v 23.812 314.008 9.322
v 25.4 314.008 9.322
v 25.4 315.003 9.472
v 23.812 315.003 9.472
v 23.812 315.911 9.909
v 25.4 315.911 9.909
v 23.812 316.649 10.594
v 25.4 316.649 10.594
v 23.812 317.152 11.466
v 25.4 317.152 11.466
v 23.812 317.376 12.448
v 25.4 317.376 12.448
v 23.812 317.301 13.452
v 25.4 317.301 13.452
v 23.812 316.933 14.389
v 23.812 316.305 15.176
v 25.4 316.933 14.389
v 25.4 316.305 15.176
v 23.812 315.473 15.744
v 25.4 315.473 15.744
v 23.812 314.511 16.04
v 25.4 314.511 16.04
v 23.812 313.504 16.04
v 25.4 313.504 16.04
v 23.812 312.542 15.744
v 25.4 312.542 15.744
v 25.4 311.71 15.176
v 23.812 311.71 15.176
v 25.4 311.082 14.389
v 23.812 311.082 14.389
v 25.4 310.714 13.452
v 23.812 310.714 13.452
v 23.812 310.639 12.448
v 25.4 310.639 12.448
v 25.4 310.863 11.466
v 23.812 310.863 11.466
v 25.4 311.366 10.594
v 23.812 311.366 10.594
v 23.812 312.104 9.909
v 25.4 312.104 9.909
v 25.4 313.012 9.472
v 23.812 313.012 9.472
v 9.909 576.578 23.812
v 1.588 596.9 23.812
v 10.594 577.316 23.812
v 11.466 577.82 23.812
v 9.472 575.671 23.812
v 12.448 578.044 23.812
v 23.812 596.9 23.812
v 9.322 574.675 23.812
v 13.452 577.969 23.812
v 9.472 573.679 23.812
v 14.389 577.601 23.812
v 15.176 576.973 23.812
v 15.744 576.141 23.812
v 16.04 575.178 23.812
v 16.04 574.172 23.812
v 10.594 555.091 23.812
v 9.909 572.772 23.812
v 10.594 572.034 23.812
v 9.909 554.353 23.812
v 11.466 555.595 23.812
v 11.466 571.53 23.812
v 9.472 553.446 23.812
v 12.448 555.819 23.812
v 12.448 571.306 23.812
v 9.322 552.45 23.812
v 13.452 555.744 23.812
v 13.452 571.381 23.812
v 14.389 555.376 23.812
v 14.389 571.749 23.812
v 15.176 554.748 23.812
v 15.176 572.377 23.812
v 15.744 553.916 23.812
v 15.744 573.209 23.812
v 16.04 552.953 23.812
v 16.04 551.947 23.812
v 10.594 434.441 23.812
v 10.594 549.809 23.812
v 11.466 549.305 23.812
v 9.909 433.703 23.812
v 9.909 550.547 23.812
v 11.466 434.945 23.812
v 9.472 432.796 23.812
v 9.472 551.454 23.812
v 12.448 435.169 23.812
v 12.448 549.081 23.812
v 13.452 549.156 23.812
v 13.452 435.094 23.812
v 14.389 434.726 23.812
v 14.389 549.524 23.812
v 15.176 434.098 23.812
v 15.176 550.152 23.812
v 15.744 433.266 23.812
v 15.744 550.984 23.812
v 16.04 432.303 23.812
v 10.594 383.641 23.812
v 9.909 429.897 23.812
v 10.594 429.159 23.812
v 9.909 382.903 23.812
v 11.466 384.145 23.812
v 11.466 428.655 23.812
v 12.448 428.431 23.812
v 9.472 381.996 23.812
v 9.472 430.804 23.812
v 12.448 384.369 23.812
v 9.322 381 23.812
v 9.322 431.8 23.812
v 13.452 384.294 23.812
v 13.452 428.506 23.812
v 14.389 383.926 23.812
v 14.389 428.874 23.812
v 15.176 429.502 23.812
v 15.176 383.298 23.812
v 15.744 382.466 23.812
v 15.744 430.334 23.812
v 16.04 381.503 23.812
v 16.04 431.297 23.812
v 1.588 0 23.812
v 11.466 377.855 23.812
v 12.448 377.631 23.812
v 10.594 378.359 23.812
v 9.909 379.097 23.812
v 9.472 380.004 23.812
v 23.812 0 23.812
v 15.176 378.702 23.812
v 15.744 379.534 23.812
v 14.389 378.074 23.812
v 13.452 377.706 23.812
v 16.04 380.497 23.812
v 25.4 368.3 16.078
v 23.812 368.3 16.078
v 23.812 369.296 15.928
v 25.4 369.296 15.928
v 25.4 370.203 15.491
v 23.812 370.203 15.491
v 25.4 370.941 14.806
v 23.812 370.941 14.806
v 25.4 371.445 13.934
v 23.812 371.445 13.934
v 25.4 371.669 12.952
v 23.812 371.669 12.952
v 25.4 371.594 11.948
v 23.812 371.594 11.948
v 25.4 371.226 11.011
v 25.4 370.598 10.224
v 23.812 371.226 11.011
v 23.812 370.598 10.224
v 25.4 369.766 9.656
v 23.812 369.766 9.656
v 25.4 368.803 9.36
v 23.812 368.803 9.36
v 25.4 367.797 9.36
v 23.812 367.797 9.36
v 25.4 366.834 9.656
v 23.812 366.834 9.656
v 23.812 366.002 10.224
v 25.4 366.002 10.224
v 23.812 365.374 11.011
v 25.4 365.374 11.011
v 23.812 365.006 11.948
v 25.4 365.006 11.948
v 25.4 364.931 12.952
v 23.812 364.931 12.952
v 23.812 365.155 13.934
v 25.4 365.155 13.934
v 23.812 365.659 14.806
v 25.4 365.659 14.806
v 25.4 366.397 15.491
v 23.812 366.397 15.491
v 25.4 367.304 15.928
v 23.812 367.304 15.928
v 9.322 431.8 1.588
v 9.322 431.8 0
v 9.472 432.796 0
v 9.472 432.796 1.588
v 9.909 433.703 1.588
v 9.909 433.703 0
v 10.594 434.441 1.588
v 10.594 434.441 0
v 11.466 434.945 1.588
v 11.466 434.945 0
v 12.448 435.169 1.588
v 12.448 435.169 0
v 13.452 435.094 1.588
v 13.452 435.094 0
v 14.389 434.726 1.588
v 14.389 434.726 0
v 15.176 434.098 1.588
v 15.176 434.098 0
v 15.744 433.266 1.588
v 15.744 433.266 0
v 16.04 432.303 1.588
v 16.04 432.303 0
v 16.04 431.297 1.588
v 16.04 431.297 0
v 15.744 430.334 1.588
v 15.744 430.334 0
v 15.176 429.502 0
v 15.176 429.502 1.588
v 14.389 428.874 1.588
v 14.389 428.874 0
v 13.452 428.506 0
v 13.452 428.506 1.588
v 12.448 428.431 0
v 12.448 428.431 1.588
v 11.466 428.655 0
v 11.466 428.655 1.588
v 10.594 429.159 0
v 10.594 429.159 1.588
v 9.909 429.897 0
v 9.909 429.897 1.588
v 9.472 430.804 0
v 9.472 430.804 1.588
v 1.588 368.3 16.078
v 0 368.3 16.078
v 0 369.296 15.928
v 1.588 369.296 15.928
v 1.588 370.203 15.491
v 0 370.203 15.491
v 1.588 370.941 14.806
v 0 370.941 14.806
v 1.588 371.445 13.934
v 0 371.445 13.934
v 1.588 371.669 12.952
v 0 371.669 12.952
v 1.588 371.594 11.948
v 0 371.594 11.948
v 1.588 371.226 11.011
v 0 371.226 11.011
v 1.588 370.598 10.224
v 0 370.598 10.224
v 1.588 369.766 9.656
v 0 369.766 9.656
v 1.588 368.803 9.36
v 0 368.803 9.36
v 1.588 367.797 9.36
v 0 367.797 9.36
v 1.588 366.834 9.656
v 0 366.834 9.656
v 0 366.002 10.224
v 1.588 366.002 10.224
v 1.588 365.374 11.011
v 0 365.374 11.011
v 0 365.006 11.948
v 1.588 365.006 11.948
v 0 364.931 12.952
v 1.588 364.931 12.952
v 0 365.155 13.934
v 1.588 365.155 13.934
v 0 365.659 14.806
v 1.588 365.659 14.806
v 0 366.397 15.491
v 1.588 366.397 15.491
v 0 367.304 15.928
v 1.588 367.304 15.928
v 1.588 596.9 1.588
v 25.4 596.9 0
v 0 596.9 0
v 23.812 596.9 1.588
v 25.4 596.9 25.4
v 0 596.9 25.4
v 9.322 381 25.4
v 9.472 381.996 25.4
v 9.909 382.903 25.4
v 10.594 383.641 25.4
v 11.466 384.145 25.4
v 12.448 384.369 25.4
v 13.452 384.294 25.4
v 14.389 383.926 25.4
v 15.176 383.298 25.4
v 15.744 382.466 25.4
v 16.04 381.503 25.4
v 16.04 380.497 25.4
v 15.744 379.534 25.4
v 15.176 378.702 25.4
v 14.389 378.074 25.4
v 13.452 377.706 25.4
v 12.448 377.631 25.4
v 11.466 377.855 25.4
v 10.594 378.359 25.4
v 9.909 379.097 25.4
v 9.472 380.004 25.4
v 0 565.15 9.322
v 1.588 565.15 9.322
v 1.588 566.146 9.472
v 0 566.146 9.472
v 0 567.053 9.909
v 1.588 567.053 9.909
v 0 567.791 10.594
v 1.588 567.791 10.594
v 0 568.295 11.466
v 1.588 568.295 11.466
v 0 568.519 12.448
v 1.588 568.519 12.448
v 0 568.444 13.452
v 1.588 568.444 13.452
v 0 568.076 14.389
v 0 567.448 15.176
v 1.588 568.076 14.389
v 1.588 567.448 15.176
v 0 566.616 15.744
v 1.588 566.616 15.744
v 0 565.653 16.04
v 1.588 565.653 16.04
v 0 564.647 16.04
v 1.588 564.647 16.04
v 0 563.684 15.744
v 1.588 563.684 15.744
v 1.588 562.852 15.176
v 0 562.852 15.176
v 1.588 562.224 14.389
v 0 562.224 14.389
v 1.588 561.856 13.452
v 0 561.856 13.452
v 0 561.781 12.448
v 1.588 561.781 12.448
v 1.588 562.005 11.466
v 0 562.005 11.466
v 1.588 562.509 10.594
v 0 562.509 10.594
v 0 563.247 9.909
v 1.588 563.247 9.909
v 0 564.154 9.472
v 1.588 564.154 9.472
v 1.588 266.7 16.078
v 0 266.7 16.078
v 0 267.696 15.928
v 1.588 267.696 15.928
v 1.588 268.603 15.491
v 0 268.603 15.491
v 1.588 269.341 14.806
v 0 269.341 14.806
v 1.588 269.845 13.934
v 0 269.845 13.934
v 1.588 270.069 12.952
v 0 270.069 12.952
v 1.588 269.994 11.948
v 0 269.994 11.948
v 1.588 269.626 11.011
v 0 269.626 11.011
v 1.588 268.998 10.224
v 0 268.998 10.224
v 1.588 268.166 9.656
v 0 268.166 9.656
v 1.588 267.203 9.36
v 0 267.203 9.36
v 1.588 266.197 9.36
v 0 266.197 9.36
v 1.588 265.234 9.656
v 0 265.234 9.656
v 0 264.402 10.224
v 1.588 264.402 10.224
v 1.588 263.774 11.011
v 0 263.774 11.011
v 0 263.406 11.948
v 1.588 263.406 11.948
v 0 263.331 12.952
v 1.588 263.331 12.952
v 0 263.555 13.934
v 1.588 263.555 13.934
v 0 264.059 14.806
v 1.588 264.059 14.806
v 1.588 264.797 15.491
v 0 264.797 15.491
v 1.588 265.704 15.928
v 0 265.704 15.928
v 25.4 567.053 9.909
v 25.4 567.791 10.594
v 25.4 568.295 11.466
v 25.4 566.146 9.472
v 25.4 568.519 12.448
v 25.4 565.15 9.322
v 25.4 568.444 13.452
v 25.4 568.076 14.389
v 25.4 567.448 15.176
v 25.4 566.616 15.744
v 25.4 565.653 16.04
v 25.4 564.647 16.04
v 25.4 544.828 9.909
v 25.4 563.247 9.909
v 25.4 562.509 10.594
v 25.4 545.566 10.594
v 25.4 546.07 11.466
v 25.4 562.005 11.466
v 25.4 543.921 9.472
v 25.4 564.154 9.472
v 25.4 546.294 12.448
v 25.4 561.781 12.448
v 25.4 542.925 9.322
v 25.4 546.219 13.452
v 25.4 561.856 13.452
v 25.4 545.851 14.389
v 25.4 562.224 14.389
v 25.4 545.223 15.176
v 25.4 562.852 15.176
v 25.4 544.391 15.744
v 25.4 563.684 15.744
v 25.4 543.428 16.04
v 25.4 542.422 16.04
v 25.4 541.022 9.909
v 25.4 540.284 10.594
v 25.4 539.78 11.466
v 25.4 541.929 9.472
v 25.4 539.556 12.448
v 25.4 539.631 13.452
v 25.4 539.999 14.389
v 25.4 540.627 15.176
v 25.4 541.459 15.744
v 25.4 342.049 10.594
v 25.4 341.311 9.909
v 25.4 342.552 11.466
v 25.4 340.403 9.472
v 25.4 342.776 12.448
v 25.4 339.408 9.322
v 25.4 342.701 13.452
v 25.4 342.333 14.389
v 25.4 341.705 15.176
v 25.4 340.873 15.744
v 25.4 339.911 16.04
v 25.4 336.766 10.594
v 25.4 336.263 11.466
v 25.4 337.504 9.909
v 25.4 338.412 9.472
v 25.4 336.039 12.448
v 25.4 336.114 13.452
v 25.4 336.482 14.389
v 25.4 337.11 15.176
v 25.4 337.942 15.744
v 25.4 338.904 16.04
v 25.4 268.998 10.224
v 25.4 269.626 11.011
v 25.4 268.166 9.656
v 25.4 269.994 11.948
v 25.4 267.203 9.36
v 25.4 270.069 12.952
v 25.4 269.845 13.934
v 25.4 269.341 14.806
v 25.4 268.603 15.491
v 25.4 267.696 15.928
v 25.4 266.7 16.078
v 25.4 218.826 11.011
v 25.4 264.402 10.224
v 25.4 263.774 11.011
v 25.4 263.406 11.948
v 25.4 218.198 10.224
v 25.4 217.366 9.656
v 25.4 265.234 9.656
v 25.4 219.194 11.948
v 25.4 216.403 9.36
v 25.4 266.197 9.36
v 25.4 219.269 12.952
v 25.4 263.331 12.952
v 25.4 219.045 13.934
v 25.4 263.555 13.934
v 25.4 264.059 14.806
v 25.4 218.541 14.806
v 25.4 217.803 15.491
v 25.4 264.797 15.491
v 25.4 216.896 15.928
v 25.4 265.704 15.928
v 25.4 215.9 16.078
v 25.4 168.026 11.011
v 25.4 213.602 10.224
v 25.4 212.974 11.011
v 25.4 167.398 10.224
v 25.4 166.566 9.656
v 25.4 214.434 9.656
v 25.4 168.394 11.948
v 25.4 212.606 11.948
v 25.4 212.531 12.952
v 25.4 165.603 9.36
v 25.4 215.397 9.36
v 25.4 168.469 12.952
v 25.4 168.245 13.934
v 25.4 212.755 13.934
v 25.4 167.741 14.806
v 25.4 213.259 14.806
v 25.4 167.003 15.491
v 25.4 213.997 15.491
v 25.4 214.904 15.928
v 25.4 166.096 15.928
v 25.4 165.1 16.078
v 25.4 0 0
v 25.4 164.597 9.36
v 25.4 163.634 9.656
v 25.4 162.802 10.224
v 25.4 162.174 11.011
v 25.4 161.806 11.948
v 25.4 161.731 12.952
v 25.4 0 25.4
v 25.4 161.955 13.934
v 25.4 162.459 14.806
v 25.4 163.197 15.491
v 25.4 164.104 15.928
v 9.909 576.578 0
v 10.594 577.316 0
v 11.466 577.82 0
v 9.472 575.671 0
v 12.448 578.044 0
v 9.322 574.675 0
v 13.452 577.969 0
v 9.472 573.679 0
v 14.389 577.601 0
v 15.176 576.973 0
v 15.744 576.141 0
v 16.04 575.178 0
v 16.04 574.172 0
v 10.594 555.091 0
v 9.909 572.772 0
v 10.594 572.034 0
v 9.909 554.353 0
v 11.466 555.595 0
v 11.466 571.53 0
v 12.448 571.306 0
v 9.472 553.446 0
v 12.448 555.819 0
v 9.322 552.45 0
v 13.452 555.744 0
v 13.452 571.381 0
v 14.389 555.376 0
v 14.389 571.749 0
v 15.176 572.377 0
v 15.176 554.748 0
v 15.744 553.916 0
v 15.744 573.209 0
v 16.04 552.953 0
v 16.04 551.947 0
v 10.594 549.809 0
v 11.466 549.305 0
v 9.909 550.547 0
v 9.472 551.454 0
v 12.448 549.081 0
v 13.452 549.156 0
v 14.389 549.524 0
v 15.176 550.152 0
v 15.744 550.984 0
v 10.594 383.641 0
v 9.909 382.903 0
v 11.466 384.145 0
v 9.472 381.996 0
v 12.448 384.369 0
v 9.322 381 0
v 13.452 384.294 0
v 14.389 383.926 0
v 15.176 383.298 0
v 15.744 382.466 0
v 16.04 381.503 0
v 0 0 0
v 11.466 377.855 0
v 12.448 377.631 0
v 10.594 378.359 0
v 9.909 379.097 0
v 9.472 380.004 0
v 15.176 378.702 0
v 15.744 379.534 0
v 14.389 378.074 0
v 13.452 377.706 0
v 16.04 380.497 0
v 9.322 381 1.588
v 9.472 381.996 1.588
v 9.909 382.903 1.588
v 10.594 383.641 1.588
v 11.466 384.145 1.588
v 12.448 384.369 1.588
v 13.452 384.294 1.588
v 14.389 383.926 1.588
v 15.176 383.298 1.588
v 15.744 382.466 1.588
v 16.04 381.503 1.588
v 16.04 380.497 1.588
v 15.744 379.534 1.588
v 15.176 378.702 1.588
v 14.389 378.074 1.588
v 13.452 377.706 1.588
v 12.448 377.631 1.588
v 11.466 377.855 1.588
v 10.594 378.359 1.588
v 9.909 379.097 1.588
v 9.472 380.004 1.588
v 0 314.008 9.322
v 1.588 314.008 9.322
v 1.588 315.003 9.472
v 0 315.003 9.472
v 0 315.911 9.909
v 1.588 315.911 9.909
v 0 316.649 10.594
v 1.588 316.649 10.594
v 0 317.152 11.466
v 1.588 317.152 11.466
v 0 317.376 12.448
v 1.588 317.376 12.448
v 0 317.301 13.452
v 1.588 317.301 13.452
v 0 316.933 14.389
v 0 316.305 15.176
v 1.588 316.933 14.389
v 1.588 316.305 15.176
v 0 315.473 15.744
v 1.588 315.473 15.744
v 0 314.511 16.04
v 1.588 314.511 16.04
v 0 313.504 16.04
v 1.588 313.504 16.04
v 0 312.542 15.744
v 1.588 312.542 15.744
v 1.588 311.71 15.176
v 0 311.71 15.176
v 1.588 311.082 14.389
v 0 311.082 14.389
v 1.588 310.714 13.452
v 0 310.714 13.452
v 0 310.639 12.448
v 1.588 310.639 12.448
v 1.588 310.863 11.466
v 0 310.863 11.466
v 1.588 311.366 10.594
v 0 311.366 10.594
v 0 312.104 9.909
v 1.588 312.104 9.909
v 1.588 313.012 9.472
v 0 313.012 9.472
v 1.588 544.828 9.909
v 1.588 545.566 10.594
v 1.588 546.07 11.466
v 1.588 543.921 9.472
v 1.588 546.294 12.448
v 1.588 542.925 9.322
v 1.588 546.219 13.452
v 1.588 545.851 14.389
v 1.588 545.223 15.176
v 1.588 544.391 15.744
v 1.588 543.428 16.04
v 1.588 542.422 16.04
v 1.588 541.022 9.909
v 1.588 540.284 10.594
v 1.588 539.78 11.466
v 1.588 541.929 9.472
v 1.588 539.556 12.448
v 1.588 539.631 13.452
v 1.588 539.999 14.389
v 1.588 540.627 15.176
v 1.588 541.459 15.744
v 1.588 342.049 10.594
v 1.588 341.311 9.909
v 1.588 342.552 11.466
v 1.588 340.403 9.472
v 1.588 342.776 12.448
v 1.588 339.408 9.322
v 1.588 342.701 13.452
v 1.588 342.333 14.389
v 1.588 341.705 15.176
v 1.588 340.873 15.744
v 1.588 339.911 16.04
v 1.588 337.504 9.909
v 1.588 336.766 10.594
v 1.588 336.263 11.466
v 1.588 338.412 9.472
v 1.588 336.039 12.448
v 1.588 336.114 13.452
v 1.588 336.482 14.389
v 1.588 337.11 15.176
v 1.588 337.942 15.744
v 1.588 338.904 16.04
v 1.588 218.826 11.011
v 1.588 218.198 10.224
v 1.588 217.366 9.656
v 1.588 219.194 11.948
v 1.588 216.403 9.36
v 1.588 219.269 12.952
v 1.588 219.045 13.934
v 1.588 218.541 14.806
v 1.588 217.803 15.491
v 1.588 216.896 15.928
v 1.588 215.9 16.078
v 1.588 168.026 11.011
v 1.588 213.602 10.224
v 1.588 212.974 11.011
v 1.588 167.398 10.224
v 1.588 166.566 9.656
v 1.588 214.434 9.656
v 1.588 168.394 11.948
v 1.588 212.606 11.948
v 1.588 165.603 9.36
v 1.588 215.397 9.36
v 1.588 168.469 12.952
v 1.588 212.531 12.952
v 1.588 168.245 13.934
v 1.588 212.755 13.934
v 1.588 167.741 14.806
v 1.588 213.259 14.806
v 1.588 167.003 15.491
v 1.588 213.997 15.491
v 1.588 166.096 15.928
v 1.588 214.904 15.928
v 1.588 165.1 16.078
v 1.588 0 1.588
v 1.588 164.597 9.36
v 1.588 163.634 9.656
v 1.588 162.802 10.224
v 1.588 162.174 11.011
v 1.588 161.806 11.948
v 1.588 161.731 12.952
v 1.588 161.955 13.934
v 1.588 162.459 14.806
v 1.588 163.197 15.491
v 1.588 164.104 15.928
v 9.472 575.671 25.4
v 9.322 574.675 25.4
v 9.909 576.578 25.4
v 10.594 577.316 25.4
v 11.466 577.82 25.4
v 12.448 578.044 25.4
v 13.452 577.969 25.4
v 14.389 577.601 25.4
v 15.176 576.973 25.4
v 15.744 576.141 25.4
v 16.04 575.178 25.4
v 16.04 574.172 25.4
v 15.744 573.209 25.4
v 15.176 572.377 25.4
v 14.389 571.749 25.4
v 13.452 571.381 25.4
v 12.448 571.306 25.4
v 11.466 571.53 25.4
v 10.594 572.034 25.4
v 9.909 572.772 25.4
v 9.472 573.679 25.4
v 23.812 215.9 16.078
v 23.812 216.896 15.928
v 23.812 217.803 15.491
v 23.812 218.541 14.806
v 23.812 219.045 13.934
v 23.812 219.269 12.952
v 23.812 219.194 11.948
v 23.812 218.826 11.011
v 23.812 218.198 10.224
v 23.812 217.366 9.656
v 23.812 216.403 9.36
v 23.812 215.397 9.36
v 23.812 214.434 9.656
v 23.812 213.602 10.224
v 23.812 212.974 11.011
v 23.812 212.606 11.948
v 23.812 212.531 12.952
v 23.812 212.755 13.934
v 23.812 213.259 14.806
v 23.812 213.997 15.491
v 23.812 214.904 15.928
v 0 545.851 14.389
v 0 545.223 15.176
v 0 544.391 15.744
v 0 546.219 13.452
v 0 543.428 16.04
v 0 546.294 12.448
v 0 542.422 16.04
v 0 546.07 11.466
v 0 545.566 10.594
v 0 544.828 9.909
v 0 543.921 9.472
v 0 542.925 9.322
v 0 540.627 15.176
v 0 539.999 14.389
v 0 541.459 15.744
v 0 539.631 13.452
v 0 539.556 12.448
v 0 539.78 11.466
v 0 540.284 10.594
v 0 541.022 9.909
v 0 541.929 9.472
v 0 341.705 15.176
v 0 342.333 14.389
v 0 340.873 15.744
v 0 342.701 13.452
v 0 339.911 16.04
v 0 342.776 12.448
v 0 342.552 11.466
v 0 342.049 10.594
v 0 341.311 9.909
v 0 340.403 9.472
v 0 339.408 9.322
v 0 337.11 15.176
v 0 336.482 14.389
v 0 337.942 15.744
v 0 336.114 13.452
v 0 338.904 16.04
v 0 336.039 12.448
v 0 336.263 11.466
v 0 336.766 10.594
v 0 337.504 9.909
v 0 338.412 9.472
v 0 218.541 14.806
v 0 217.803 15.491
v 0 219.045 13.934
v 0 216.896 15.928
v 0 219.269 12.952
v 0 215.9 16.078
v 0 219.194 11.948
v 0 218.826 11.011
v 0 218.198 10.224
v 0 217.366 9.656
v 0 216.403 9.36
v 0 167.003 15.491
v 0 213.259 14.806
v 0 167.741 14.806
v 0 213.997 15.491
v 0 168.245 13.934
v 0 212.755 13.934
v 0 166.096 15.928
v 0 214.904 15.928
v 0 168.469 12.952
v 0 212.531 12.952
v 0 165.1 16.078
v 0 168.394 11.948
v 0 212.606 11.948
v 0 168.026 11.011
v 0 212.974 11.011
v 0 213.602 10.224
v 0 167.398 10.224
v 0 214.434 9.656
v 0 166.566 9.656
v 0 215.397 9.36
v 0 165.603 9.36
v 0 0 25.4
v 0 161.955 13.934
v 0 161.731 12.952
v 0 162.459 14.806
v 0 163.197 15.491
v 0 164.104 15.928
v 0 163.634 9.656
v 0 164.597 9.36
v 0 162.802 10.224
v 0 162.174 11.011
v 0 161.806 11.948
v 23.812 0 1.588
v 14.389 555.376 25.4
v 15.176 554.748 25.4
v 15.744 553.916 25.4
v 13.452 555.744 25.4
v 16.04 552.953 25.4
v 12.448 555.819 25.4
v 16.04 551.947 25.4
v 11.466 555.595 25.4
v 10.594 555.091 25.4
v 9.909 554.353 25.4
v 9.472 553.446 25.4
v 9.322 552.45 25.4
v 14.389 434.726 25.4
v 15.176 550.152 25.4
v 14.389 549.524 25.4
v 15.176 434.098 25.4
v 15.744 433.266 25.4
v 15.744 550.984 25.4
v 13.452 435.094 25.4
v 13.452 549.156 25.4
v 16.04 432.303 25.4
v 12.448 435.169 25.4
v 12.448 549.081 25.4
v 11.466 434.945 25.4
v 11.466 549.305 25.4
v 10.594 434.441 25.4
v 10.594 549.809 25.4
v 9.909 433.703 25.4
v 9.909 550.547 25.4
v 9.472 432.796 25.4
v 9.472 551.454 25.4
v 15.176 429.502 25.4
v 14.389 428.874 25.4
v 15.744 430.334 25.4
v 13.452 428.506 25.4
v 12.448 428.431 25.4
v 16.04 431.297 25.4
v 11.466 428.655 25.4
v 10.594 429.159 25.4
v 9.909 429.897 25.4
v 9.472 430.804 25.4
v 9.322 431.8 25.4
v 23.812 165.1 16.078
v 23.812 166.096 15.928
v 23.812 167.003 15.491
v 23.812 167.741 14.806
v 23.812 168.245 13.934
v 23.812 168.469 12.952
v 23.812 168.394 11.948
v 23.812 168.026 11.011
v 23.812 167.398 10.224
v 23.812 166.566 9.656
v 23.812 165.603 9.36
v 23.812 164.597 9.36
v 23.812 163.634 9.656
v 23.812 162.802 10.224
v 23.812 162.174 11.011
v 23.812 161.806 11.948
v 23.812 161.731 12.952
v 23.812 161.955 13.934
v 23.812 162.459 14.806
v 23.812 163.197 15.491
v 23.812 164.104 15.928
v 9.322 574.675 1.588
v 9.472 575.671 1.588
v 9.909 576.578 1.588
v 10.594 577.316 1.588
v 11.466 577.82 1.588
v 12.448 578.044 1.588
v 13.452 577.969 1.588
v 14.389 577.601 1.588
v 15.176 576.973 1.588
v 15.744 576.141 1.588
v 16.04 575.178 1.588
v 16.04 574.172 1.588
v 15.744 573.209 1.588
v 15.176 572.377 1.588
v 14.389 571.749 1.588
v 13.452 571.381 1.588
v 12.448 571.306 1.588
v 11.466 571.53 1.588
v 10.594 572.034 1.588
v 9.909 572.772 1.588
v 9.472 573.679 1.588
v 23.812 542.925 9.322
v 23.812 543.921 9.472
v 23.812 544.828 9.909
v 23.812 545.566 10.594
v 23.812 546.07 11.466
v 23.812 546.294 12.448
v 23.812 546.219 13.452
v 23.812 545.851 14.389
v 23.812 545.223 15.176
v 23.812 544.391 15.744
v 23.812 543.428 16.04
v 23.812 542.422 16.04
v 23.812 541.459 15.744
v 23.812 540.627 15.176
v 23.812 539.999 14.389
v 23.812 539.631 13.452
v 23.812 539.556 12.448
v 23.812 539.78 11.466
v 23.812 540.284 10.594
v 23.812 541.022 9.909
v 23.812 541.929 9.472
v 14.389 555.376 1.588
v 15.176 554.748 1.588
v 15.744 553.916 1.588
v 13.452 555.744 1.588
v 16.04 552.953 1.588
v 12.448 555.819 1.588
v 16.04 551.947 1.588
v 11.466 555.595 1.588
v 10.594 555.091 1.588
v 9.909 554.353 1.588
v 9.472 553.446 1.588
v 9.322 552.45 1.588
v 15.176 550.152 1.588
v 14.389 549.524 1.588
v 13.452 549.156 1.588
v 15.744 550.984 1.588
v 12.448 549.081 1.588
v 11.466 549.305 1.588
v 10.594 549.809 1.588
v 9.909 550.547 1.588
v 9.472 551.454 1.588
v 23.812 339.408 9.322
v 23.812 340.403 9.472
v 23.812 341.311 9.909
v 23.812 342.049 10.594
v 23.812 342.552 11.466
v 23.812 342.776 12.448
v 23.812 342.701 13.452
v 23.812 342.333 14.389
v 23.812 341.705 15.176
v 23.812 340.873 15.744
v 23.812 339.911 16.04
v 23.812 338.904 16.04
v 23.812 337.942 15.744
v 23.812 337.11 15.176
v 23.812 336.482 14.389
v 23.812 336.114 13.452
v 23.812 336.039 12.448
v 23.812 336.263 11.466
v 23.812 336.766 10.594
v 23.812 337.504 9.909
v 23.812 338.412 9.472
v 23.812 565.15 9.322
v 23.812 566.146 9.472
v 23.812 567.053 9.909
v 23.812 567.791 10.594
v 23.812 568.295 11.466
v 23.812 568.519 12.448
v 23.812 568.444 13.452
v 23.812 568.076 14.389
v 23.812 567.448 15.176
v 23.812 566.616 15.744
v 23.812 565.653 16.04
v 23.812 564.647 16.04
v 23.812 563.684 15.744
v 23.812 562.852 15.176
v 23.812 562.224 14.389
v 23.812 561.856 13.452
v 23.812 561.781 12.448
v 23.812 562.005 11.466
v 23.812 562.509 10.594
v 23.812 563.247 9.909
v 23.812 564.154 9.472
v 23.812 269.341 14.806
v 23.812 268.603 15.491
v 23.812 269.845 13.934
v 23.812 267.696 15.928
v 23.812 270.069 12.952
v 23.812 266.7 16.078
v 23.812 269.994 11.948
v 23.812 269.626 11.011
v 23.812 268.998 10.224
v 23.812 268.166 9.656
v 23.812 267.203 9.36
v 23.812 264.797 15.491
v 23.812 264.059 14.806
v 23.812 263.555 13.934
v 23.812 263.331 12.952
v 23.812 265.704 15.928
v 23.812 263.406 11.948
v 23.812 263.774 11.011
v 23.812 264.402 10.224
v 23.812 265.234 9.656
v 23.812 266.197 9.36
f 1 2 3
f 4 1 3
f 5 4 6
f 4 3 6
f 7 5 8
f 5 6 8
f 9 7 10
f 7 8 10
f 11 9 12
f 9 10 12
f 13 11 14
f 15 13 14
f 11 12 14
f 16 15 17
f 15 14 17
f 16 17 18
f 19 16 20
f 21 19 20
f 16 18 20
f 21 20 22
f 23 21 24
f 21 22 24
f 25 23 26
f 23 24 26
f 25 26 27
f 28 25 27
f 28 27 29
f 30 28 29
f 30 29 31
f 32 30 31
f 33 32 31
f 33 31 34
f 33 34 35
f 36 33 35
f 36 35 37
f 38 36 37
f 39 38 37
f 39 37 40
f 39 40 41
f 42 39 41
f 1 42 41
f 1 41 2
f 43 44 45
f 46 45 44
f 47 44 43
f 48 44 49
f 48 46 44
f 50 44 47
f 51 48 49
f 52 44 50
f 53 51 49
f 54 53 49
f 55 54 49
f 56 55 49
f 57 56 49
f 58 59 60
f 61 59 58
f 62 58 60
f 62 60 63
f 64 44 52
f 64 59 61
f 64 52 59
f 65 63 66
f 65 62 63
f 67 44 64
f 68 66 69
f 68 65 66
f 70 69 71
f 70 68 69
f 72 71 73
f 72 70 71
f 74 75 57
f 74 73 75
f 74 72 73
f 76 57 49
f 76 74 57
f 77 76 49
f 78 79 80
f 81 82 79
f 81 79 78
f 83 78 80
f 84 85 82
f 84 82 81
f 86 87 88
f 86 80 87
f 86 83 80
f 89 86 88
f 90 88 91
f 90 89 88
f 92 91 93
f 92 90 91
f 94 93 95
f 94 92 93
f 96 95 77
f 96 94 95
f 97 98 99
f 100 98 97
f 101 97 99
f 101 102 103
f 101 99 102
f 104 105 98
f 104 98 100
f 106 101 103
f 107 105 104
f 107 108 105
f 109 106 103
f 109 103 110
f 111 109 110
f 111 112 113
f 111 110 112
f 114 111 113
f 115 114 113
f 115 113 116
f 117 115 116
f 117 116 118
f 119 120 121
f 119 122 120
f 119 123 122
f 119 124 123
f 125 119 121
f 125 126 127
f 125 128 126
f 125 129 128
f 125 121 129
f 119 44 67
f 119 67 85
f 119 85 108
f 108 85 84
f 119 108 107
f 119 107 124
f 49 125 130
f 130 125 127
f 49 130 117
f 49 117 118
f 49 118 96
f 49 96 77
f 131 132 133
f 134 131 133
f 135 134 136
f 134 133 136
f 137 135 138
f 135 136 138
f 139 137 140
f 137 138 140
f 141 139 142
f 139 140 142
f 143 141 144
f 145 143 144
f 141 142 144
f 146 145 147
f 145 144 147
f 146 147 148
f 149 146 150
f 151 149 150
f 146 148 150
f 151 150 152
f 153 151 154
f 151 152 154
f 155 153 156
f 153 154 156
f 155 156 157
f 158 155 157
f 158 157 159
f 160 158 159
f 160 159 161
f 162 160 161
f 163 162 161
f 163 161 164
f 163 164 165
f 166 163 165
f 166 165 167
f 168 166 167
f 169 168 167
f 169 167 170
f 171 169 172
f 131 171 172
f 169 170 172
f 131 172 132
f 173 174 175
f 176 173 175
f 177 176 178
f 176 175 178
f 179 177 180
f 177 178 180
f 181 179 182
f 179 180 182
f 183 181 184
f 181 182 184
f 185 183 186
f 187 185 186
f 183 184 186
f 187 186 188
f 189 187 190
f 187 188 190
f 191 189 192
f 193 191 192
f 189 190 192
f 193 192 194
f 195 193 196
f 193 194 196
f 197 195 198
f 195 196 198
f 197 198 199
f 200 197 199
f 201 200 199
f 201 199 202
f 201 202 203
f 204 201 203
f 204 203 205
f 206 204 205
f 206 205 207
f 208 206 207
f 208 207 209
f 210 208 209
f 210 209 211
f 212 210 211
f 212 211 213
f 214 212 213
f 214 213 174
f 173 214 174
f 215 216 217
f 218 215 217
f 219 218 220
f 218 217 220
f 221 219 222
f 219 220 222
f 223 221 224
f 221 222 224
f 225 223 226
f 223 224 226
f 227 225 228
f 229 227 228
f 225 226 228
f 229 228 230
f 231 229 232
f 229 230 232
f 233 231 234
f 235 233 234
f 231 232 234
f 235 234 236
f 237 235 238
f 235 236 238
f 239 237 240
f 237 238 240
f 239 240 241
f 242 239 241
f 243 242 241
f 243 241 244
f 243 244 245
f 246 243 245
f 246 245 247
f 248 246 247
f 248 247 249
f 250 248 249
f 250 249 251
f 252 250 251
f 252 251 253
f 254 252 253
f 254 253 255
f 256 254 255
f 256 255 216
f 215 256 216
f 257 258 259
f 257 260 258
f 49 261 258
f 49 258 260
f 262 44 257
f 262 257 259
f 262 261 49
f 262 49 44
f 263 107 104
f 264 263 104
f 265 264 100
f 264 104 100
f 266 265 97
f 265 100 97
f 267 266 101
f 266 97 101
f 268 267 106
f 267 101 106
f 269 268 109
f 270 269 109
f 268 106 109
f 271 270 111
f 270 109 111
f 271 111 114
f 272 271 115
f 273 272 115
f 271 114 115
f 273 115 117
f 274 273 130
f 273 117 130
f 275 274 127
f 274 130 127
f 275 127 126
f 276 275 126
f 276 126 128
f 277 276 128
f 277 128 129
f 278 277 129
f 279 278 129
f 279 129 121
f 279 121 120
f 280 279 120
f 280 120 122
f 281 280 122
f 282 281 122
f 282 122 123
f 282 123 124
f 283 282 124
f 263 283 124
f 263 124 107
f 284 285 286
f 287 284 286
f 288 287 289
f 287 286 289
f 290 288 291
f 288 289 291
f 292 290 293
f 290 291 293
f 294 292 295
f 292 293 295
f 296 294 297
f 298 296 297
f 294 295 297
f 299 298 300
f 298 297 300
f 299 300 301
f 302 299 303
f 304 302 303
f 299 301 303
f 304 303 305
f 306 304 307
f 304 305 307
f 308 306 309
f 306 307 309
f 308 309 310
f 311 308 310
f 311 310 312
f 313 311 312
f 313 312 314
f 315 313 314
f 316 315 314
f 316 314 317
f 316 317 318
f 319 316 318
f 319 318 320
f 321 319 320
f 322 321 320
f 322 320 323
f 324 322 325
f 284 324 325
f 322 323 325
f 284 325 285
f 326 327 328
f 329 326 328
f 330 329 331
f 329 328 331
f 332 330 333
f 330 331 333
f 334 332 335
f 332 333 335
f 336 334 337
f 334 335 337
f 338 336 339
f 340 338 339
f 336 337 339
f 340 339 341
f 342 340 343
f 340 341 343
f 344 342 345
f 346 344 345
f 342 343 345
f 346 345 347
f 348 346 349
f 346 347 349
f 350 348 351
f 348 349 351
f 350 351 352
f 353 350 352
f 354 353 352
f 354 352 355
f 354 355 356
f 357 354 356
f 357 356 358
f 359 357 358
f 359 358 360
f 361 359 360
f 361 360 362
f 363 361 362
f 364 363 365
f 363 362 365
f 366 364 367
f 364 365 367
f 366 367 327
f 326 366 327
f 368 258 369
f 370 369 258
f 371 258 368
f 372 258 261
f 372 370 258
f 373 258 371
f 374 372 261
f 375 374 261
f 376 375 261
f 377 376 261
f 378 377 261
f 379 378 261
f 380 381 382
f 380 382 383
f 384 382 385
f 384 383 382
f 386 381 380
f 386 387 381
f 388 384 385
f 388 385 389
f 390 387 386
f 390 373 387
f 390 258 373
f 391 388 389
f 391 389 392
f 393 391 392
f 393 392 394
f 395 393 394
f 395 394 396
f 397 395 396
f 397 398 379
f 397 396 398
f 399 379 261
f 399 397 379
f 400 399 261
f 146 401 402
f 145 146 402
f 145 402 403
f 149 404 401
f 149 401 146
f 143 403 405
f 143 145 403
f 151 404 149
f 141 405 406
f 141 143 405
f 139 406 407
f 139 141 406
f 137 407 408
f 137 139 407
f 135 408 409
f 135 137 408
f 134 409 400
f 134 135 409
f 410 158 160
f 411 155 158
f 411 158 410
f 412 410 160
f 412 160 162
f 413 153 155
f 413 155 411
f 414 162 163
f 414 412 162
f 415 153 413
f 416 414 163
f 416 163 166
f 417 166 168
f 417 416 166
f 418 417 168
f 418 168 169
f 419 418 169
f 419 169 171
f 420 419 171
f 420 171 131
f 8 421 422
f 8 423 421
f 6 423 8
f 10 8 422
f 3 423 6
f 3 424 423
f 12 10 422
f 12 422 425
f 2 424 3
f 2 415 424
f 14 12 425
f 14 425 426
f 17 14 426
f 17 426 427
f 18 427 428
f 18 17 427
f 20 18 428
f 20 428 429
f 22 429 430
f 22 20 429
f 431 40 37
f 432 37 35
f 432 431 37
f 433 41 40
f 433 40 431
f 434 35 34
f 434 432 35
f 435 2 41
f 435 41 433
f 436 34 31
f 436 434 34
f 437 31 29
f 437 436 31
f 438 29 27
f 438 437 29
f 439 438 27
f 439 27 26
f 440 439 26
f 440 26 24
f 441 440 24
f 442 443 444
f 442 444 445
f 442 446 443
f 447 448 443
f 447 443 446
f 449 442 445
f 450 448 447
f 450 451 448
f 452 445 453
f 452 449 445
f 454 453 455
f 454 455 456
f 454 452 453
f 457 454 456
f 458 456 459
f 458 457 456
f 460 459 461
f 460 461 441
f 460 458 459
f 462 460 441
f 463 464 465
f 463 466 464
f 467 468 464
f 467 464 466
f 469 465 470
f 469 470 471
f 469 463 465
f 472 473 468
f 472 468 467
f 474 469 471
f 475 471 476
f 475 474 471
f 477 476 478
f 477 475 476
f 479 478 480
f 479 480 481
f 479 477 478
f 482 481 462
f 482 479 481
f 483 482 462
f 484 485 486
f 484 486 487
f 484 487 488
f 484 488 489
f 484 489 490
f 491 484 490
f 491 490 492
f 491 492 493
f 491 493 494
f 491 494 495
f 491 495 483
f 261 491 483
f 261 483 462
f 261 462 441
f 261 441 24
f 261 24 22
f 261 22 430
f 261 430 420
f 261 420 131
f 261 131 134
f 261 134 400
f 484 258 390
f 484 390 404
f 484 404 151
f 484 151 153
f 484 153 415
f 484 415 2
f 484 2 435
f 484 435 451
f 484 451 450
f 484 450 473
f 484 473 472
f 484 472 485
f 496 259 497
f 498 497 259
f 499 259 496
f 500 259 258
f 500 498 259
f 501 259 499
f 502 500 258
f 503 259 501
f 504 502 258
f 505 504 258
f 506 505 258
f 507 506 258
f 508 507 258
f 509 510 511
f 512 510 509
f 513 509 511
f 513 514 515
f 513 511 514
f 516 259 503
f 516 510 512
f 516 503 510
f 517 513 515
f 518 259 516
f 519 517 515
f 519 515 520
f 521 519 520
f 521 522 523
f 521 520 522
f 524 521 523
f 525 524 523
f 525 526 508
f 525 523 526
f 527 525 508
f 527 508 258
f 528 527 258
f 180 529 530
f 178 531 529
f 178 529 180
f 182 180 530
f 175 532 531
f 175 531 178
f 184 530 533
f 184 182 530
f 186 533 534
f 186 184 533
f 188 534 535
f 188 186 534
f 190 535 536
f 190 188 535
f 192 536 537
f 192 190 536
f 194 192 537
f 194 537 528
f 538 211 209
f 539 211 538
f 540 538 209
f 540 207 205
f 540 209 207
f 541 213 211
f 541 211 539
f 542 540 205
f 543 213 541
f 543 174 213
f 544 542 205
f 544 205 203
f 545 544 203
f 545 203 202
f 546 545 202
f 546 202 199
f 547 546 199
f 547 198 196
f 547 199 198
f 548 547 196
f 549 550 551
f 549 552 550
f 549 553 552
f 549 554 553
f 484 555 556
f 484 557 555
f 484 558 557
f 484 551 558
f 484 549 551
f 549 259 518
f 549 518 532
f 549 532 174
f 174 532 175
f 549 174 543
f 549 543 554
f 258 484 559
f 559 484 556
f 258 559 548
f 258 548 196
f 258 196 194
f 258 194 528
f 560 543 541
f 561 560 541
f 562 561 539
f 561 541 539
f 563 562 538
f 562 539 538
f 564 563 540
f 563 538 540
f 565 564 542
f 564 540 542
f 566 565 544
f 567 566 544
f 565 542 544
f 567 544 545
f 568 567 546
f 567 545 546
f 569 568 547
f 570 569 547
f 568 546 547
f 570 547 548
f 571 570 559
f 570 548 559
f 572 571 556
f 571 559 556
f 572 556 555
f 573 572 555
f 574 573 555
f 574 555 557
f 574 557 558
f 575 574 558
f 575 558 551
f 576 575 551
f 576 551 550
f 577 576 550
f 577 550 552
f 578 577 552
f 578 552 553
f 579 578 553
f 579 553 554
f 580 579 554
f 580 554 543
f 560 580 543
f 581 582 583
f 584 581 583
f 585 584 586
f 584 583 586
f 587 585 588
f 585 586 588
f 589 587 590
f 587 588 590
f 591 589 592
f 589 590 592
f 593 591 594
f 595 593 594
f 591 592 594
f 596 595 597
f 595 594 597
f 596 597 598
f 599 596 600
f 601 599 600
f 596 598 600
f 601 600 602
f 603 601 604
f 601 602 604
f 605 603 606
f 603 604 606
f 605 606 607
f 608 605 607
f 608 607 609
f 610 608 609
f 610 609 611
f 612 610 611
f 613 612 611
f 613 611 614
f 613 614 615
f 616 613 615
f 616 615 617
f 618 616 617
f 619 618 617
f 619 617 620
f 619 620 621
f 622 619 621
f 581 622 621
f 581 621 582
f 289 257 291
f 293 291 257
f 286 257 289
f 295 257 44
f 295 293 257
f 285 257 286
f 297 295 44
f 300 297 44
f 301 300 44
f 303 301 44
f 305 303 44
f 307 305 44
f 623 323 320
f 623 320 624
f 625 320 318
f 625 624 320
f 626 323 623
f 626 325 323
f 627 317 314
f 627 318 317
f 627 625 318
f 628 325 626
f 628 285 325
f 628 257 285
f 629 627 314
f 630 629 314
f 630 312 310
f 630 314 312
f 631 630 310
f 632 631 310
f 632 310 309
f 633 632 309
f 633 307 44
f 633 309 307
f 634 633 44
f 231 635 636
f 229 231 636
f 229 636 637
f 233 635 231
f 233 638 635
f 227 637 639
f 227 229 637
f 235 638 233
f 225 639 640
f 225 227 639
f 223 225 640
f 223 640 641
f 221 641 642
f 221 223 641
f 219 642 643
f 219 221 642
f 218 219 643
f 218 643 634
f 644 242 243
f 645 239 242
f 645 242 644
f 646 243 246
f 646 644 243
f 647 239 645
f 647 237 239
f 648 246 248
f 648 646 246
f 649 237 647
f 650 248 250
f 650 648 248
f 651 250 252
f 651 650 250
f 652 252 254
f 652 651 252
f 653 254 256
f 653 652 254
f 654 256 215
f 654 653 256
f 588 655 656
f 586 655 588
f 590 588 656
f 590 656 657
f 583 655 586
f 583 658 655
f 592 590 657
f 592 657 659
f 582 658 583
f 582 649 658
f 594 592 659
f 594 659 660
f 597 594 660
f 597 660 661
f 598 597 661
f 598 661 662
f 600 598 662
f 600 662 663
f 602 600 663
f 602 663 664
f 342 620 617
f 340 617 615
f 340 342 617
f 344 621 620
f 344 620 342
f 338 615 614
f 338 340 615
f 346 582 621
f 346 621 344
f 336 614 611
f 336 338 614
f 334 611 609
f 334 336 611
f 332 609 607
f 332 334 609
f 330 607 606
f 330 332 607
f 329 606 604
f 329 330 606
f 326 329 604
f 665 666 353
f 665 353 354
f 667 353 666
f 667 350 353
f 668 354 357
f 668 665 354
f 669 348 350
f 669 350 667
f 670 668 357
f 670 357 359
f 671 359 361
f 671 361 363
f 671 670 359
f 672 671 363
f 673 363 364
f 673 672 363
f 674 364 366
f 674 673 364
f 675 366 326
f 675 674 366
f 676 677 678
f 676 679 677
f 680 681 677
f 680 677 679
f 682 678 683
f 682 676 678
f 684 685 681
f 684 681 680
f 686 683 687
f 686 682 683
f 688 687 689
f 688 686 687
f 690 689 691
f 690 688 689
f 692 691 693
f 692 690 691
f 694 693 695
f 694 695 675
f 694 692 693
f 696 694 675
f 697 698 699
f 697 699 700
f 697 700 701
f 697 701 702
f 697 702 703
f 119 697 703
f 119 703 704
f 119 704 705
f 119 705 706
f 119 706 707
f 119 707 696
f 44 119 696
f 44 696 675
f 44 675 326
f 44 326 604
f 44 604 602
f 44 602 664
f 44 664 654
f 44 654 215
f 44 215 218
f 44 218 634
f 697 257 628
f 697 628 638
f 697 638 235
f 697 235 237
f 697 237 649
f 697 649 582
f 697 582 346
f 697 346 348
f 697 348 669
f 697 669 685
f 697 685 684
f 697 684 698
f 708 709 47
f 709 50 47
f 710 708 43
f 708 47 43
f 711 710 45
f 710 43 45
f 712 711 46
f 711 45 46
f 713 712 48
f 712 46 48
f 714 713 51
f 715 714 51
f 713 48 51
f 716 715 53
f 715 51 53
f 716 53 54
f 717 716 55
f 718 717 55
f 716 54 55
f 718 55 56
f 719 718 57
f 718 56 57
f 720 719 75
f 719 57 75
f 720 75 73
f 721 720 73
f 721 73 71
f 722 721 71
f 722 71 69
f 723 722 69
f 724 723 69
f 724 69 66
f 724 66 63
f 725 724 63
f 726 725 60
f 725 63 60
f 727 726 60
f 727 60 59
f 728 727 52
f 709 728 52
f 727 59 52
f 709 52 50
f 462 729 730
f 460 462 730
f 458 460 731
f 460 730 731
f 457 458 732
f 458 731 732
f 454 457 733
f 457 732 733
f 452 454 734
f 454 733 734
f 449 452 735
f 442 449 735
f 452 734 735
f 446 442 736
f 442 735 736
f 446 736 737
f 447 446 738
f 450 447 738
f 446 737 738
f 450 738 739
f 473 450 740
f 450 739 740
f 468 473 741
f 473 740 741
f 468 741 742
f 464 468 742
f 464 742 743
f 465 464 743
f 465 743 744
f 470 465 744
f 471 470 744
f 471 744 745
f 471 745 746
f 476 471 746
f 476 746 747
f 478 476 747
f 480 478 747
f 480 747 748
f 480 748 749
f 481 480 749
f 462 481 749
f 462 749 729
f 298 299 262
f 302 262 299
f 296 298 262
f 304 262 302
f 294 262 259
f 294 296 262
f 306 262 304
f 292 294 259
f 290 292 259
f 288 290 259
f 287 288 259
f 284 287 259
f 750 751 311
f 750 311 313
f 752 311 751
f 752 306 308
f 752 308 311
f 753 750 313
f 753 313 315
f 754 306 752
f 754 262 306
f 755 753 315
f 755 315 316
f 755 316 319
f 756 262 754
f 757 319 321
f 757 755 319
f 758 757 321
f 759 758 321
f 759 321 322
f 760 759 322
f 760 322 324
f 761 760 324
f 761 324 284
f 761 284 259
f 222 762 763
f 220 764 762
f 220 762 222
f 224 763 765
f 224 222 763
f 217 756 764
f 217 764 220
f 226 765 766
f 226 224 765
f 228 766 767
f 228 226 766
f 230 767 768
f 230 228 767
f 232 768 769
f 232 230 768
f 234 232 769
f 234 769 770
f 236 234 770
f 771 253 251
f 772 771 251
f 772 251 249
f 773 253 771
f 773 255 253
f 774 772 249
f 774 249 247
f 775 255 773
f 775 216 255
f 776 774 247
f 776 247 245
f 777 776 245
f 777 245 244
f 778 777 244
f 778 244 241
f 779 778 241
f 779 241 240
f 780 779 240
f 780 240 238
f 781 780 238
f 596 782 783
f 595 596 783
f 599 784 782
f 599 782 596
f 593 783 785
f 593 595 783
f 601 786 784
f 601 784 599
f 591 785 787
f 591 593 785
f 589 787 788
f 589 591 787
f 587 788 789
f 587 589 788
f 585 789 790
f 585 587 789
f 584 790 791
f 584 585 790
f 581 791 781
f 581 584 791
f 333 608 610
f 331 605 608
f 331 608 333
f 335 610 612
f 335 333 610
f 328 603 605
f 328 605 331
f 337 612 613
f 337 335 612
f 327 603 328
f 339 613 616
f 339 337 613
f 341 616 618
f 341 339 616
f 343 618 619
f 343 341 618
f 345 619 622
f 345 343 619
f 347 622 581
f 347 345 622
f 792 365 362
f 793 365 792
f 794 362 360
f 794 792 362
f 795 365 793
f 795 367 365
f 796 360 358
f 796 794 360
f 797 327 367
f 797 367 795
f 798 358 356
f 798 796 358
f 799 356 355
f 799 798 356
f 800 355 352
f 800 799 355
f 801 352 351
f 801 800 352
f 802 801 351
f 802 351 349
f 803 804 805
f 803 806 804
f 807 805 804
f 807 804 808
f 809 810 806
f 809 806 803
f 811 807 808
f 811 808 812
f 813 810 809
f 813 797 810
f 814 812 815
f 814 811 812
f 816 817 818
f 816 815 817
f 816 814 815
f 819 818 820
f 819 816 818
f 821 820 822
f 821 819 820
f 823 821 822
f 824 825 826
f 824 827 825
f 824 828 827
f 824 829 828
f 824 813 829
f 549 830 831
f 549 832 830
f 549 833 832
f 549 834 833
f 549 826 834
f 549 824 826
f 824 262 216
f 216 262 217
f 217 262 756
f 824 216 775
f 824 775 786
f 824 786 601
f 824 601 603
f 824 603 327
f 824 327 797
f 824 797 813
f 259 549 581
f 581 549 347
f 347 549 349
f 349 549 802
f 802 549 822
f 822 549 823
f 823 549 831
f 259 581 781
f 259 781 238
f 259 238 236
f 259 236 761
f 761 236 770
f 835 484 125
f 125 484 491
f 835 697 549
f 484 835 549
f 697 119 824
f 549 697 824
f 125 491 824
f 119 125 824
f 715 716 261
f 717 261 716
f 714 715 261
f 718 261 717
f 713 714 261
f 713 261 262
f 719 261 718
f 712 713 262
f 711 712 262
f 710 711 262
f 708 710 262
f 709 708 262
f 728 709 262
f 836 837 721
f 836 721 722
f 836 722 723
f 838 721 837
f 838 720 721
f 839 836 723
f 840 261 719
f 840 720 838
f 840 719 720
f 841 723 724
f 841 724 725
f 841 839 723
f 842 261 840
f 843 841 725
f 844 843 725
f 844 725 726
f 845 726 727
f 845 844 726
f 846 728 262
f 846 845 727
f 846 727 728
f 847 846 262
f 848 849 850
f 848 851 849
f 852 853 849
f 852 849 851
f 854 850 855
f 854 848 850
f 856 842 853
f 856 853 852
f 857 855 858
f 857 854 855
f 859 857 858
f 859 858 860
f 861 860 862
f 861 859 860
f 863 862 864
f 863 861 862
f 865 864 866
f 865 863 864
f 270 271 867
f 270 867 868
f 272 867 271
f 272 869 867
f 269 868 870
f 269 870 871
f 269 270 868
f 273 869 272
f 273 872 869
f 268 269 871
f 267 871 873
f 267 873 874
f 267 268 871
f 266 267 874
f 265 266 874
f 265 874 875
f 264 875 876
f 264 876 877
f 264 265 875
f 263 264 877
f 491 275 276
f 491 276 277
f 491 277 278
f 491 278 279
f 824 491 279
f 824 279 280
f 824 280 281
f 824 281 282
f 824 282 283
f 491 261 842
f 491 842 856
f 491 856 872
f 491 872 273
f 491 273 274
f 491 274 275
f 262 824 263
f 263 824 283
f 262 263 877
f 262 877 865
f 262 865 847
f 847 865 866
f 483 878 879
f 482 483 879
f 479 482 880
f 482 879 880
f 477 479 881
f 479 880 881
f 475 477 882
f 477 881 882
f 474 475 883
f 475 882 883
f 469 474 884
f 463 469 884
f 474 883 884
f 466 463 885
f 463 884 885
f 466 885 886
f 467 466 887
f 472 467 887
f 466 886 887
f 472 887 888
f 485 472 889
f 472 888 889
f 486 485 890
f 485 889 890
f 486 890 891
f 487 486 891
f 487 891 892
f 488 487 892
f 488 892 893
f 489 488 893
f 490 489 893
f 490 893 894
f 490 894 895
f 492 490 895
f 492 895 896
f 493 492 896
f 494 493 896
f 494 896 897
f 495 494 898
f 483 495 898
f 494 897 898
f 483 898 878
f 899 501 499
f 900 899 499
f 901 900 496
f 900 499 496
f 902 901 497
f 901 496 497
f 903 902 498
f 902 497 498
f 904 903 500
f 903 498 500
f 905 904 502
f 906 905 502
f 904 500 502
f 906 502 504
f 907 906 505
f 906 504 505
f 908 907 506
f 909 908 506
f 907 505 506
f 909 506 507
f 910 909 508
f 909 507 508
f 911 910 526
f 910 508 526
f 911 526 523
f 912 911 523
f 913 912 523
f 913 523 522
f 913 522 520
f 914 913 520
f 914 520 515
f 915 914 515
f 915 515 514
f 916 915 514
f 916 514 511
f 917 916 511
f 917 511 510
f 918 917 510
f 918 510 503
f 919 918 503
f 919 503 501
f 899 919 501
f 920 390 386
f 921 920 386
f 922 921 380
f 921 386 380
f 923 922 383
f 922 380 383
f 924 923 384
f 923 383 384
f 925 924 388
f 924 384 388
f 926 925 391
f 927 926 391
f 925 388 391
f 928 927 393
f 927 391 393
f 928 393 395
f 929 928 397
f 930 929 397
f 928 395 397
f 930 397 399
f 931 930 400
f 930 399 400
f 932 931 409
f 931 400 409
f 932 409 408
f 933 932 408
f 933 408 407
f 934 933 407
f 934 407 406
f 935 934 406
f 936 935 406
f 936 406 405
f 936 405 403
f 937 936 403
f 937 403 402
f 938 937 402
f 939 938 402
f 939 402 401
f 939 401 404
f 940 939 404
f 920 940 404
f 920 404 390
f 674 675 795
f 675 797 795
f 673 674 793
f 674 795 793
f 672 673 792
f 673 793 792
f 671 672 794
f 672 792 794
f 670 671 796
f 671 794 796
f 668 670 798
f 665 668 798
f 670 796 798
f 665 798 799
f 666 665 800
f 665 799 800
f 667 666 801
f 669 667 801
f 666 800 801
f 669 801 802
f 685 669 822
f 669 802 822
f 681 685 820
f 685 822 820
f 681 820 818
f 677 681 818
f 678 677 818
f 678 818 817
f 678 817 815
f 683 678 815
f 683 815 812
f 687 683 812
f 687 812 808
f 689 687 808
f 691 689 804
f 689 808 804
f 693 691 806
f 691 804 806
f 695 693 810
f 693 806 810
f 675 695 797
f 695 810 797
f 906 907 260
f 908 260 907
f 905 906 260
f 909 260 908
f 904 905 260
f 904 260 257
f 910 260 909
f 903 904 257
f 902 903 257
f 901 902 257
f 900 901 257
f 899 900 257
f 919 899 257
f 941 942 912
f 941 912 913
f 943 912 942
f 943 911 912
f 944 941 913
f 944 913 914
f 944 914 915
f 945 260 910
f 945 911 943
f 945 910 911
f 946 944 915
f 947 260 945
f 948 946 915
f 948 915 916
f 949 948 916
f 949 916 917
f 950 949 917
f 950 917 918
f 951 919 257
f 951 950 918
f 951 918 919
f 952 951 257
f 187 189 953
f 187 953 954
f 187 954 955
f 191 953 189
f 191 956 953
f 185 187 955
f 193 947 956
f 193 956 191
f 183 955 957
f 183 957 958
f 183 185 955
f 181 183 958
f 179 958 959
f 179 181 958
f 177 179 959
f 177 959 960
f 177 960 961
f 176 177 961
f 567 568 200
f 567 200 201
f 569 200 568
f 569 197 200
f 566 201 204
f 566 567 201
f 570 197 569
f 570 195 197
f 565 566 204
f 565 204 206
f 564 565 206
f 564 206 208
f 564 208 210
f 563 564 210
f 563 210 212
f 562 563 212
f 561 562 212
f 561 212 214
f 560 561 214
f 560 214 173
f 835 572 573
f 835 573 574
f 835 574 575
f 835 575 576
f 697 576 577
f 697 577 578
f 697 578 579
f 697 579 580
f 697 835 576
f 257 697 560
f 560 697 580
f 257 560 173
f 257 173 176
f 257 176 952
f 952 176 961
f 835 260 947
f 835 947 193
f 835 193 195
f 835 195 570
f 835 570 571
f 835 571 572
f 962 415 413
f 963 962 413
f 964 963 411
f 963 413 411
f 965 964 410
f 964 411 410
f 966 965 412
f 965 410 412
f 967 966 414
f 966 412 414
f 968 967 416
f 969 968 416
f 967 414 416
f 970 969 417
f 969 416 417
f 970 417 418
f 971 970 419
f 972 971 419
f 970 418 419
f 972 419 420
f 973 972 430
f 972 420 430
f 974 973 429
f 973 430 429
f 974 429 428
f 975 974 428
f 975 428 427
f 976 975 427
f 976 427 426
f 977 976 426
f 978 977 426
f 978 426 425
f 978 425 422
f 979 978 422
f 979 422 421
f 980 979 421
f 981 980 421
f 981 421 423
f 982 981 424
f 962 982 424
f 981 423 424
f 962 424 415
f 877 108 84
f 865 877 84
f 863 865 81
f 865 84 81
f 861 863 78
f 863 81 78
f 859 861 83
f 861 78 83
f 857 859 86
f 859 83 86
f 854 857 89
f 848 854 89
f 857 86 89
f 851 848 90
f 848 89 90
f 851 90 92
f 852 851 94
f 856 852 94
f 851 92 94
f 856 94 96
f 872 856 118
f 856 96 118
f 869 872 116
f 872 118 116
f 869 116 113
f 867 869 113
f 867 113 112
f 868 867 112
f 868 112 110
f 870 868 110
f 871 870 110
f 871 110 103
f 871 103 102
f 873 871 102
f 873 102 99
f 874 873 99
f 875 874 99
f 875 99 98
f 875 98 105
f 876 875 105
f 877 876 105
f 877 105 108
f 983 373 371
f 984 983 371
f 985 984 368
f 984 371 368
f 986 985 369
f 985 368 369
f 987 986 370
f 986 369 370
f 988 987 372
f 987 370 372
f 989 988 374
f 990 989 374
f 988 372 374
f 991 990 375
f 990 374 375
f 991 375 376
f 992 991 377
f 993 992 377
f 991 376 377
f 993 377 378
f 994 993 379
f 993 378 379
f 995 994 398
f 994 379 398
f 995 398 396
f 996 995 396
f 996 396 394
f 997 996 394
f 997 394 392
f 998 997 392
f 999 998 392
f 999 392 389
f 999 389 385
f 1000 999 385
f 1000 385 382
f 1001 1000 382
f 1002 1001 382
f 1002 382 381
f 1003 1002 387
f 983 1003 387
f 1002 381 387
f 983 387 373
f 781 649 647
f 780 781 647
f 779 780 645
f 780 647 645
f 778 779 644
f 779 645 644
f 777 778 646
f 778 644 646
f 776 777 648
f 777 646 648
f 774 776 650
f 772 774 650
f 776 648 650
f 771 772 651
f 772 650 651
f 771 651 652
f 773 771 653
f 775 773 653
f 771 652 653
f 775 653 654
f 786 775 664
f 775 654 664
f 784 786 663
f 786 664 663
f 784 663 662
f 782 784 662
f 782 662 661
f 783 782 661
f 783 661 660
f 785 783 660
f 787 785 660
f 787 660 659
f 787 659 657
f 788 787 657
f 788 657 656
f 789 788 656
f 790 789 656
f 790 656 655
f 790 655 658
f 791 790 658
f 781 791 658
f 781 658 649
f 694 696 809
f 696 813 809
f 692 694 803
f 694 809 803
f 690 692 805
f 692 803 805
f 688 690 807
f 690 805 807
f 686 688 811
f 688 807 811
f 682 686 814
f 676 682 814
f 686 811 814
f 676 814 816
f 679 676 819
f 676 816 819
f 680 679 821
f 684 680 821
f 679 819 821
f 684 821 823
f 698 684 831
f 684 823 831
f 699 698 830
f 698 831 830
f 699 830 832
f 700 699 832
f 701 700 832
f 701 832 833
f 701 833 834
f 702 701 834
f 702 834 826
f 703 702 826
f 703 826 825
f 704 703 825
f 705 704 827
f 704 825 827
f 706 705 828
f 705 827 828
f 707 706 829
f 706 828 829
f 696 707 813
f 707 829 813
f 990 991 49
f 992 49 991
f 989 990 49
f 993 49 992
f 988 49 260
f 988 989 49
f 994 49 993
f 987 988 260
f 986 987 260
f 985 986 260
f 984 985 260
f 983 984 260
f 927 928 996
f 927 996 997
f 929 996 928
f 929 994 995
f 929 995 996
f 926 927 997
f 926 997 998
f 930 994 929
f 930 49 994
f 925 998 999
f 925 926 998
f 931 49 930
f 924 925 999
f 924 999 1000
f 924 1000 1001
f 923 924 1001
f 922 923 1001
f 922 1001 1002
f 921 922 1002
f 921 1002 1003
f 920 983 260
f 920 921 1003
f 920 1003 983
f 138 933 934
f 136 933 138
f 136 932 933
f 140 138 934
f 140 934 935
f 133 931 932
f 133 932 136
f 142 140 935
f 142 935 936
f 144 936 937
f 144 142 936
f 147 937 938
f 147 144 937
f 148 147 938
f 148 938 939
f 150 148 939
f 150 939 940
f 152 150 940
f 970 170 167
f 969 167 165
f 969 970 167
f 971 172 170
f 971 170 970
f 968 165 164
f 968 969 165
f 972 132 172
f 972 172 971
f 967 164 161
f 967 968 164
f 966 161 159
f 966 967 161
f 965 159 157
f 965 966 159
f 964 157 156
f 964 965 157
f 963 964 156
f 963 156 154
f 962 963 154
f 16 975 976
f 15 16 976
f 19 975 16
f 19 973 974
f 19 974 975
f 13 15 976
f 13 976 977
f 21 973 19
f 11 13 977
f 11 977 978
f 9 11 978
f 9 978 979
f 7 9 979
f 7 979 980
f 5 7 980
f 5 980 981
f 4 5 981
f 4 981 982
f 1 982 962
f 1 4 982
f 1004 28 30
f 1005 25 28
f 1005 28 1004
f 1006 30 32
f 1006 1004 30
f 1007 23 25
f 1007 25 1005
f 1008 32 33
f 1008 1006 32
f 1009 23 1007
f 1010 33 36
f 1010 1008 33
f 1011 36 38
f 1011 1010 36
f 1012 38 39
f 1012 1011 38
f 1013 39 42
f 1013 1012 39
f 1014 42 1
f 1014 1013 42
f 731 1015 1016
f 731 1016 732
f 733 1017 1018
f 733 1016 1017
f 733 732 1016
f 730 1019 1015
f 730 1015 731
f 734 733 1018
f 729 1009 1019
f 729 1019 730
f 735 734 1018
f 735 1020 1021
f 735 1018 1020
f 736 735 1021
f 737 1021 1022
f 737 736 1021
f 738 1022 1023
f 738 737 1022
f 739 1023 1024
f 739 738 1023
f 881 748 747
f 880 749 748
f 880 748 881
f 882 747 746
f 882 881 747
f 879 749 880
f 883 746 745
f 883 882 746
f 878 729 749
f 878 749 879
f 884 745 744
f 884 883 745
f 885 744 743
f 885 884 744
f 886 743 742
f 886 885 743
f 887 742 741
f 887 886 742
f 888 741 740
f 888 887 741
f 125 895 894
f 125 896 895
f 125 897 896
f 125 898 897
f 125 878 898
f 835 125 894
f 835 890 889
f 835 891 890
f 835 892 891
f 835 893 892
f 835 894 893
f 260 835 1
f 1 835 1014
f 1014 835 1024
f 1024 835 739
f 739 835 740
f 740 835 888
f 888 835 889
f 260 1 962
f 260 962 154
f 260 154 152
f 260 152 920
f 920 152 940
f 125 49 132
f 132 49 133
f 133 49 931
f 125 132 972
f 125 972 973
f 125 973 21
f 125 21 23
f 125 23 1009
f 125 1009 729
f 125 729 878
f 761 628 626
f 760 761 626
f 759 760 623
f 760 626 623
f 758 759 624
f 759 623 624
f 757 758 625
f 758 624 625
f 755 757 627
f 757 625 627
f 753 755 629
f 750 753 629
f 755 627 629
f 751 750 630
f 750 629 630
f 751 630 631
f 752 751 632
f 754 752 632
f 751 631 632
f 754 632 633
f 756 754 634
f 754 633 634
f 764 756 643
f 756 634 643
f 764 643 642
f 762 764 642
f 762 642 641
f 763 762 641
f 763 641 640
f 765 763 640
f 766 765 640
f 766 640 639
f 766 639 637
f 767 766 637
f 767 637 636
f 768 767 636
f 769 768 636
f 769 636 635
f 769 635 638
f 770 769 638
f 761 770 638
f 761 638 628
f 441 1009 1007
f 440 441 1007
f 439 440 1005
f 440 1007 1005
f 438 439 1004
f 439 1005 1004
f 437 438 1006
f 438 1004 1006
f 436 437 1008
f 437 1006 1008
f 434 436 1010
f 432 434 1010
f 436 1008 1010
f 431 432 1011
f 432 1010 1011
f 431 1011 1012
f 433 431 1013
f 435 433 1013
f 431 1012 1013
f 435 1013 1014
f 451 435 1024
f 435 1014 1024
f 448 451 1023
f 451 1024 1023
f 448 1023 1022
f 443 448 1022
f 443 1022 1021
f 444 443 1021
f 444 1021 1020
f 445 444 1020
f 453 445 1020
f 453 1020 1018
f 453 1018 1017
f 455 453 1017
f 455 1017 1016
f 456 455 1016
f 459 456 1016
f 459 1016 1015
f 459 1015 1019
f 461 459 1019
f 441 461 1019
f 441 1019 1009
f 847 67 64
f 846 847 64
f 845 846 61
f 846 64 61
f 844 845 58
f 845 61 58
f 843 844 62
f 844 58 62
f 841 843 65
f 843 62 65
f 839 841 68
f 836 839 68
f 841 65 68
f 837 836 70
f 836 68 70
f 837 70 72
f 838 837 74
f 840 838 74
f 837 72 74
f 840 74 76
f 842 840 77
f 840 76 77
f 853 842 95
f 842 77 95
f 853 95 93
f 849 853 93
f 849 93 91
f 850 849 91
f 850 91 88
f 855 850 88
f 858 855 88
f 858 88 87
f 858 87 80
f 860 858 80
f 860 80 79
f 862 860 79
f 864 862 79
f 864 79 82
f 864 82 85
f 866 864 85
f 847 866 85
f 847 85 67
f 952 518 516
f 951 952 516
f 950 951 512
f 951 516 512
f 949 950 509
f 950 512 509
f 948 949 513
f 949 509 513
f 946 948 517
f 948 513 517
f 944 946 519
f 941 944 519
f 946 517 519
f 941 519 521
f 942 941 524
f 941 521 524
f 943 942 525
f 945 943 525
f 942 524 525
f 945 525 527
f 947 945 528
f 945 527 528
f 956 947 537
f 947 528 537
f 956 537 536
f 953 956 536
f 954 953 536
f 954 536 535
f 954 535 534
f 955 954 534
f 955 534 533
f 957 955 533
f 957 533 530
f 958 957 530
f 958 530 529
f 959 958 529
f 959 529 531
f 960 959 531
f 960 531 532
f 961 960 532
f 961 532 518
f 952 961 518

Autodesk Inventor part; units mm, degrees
ref_plane "YZ Plane" through (0, 0, 0) normal (1, 0, 0) x (0, 1, 0)
ref_plane "XZ Plane" through (0, 0, 0) normal (0, 1, 0) x (-1, 0, 0)
ref_plane "XY Plane" through (0, 0, 0) normal (0, 0, 1) x (1, 0, 0)
sketch "Sketch1" plane through (0, 0, 0) normal (0, 1, 0) x (-1, 0, 0)
  line L0 (0, 0) -> (-25.4, 0)
  line L1 (-25.4, 0) -> (-25.4, 25.4)
  line L2 (-25.4, 25.4) -> (0, 25.4)
  line L3 (0, 25.4) -> (0, 0)
  line L4 (-1.5875, 23.8125) -> (-23.8125, 23.8125)
  line L5 (-23.8125, 23.8125) -> (-23.8125, 1.5875)
  line L6 (-23.8125, 1.5875) -> (-1.5875, 1.5875)
  line L7 (-1.5875, 1.5875) -> (-1.5875, 23.8125)
  dimension "d0" = 25.4
  dimension "d2" = 25.4
  dimension "d3" = 1.5875
extrude "Extrusion1" add sketch "Sketch1" along normal blind 596.9
sketch "Sketch7" plane through (25.4, 0, 0) normal (0, 0, -1) x (-1, 0, 0)
  circle A0 centre (12.7, 552.45) radius 3.3782
  circle A1 centre (12.7, 574.675) radius 3.3782
extrude "Extrusion6" cut sketch "Sketch7" against normal blind 25.4
sketch "Sketch8" plane through (25.4, 0, 25.4) normal (1, 0, 0) x (0, 0, -1)
  circle A0 centre (12.7, 565.15) radius 3.3782
  circle A1 centre (12.7, 542.925) radius 3.3782
extrude "Extrusion7" cut sketch "Sketch8" against normal blind 25.4
sketch "Sketch9" plane through (25.4, 0, 0) normal (0, 0, -1) x (-1, 0, 0)
  circle A0 centre (12.7, 431.8) radius 3.3782 projected
  line L0 (25.4, 440.055) -> (0, 440.055) projected
  line L1 (0, 368.3) -> (0, 440.055) projected
  line L2 (25.4, 368.3) -> (0, 368.3) projected
  line L3 (25.4, 440.055) -> (25.4, 368.3) projected
  circle A1 centre (12.7, 431.8) radius 3.3782 projected
  circle A2 centre (12.7, 381) radius 3.3782 projected
extrude "Extrusion8" cut sketch "Sketch9" against normal blind 25.4 contours A0 | A2
sketch "Sketch10" plane through (25.4, 0, 25.4) normal (1, 0, 0) x (0, 0, -1)
  circle A0 centre (12.7, 339.4075) radius 3.3782
  circle A1 centre (12.7, 314.0075) radius 3.3782
extrude "Extrusion9" cut sketch "Sketch10" against normal blind 38.1
sketch "Sketch11" plane through (0, 0, 0) normal (-1, 0, 0) x (0, 0, 1)
  line L0 (25.4, 0) -> (25.4, 596.9) projected
  line L1 (0, 596.9) -> (25.4, 596.9) projected
  circle A0 centre (12.7, 368.3) radius 3.3782
  circle A1 centre (12.7, 266.7) radius 3.3782
  circle A2 centre (12.7, 215.9) radius 3.3782
  circle A3 centre (12.7, 165.1) radius 3.3782
  dimension "d27" = 6.7564
  dimension "d29" = 228.6
  dimension "d30" = 6.7564
  dimension "d31" = 330.2
  dimension "d32" = 6.7564
  dimension "d33" = 381
  dimension "d34" = 6.7564
  dimension "d35" = 431.8
  dimension "d36" = 12.7
  dimension "d37" = 12.7
  dimension "d38" = 12.7
  dimension "d39" = 12.7
extrude "Extrusion10" cut sketch "Sketch11" against normal blind 25.4
properties part number "Edge Mount" material "Aluminum 6061"
